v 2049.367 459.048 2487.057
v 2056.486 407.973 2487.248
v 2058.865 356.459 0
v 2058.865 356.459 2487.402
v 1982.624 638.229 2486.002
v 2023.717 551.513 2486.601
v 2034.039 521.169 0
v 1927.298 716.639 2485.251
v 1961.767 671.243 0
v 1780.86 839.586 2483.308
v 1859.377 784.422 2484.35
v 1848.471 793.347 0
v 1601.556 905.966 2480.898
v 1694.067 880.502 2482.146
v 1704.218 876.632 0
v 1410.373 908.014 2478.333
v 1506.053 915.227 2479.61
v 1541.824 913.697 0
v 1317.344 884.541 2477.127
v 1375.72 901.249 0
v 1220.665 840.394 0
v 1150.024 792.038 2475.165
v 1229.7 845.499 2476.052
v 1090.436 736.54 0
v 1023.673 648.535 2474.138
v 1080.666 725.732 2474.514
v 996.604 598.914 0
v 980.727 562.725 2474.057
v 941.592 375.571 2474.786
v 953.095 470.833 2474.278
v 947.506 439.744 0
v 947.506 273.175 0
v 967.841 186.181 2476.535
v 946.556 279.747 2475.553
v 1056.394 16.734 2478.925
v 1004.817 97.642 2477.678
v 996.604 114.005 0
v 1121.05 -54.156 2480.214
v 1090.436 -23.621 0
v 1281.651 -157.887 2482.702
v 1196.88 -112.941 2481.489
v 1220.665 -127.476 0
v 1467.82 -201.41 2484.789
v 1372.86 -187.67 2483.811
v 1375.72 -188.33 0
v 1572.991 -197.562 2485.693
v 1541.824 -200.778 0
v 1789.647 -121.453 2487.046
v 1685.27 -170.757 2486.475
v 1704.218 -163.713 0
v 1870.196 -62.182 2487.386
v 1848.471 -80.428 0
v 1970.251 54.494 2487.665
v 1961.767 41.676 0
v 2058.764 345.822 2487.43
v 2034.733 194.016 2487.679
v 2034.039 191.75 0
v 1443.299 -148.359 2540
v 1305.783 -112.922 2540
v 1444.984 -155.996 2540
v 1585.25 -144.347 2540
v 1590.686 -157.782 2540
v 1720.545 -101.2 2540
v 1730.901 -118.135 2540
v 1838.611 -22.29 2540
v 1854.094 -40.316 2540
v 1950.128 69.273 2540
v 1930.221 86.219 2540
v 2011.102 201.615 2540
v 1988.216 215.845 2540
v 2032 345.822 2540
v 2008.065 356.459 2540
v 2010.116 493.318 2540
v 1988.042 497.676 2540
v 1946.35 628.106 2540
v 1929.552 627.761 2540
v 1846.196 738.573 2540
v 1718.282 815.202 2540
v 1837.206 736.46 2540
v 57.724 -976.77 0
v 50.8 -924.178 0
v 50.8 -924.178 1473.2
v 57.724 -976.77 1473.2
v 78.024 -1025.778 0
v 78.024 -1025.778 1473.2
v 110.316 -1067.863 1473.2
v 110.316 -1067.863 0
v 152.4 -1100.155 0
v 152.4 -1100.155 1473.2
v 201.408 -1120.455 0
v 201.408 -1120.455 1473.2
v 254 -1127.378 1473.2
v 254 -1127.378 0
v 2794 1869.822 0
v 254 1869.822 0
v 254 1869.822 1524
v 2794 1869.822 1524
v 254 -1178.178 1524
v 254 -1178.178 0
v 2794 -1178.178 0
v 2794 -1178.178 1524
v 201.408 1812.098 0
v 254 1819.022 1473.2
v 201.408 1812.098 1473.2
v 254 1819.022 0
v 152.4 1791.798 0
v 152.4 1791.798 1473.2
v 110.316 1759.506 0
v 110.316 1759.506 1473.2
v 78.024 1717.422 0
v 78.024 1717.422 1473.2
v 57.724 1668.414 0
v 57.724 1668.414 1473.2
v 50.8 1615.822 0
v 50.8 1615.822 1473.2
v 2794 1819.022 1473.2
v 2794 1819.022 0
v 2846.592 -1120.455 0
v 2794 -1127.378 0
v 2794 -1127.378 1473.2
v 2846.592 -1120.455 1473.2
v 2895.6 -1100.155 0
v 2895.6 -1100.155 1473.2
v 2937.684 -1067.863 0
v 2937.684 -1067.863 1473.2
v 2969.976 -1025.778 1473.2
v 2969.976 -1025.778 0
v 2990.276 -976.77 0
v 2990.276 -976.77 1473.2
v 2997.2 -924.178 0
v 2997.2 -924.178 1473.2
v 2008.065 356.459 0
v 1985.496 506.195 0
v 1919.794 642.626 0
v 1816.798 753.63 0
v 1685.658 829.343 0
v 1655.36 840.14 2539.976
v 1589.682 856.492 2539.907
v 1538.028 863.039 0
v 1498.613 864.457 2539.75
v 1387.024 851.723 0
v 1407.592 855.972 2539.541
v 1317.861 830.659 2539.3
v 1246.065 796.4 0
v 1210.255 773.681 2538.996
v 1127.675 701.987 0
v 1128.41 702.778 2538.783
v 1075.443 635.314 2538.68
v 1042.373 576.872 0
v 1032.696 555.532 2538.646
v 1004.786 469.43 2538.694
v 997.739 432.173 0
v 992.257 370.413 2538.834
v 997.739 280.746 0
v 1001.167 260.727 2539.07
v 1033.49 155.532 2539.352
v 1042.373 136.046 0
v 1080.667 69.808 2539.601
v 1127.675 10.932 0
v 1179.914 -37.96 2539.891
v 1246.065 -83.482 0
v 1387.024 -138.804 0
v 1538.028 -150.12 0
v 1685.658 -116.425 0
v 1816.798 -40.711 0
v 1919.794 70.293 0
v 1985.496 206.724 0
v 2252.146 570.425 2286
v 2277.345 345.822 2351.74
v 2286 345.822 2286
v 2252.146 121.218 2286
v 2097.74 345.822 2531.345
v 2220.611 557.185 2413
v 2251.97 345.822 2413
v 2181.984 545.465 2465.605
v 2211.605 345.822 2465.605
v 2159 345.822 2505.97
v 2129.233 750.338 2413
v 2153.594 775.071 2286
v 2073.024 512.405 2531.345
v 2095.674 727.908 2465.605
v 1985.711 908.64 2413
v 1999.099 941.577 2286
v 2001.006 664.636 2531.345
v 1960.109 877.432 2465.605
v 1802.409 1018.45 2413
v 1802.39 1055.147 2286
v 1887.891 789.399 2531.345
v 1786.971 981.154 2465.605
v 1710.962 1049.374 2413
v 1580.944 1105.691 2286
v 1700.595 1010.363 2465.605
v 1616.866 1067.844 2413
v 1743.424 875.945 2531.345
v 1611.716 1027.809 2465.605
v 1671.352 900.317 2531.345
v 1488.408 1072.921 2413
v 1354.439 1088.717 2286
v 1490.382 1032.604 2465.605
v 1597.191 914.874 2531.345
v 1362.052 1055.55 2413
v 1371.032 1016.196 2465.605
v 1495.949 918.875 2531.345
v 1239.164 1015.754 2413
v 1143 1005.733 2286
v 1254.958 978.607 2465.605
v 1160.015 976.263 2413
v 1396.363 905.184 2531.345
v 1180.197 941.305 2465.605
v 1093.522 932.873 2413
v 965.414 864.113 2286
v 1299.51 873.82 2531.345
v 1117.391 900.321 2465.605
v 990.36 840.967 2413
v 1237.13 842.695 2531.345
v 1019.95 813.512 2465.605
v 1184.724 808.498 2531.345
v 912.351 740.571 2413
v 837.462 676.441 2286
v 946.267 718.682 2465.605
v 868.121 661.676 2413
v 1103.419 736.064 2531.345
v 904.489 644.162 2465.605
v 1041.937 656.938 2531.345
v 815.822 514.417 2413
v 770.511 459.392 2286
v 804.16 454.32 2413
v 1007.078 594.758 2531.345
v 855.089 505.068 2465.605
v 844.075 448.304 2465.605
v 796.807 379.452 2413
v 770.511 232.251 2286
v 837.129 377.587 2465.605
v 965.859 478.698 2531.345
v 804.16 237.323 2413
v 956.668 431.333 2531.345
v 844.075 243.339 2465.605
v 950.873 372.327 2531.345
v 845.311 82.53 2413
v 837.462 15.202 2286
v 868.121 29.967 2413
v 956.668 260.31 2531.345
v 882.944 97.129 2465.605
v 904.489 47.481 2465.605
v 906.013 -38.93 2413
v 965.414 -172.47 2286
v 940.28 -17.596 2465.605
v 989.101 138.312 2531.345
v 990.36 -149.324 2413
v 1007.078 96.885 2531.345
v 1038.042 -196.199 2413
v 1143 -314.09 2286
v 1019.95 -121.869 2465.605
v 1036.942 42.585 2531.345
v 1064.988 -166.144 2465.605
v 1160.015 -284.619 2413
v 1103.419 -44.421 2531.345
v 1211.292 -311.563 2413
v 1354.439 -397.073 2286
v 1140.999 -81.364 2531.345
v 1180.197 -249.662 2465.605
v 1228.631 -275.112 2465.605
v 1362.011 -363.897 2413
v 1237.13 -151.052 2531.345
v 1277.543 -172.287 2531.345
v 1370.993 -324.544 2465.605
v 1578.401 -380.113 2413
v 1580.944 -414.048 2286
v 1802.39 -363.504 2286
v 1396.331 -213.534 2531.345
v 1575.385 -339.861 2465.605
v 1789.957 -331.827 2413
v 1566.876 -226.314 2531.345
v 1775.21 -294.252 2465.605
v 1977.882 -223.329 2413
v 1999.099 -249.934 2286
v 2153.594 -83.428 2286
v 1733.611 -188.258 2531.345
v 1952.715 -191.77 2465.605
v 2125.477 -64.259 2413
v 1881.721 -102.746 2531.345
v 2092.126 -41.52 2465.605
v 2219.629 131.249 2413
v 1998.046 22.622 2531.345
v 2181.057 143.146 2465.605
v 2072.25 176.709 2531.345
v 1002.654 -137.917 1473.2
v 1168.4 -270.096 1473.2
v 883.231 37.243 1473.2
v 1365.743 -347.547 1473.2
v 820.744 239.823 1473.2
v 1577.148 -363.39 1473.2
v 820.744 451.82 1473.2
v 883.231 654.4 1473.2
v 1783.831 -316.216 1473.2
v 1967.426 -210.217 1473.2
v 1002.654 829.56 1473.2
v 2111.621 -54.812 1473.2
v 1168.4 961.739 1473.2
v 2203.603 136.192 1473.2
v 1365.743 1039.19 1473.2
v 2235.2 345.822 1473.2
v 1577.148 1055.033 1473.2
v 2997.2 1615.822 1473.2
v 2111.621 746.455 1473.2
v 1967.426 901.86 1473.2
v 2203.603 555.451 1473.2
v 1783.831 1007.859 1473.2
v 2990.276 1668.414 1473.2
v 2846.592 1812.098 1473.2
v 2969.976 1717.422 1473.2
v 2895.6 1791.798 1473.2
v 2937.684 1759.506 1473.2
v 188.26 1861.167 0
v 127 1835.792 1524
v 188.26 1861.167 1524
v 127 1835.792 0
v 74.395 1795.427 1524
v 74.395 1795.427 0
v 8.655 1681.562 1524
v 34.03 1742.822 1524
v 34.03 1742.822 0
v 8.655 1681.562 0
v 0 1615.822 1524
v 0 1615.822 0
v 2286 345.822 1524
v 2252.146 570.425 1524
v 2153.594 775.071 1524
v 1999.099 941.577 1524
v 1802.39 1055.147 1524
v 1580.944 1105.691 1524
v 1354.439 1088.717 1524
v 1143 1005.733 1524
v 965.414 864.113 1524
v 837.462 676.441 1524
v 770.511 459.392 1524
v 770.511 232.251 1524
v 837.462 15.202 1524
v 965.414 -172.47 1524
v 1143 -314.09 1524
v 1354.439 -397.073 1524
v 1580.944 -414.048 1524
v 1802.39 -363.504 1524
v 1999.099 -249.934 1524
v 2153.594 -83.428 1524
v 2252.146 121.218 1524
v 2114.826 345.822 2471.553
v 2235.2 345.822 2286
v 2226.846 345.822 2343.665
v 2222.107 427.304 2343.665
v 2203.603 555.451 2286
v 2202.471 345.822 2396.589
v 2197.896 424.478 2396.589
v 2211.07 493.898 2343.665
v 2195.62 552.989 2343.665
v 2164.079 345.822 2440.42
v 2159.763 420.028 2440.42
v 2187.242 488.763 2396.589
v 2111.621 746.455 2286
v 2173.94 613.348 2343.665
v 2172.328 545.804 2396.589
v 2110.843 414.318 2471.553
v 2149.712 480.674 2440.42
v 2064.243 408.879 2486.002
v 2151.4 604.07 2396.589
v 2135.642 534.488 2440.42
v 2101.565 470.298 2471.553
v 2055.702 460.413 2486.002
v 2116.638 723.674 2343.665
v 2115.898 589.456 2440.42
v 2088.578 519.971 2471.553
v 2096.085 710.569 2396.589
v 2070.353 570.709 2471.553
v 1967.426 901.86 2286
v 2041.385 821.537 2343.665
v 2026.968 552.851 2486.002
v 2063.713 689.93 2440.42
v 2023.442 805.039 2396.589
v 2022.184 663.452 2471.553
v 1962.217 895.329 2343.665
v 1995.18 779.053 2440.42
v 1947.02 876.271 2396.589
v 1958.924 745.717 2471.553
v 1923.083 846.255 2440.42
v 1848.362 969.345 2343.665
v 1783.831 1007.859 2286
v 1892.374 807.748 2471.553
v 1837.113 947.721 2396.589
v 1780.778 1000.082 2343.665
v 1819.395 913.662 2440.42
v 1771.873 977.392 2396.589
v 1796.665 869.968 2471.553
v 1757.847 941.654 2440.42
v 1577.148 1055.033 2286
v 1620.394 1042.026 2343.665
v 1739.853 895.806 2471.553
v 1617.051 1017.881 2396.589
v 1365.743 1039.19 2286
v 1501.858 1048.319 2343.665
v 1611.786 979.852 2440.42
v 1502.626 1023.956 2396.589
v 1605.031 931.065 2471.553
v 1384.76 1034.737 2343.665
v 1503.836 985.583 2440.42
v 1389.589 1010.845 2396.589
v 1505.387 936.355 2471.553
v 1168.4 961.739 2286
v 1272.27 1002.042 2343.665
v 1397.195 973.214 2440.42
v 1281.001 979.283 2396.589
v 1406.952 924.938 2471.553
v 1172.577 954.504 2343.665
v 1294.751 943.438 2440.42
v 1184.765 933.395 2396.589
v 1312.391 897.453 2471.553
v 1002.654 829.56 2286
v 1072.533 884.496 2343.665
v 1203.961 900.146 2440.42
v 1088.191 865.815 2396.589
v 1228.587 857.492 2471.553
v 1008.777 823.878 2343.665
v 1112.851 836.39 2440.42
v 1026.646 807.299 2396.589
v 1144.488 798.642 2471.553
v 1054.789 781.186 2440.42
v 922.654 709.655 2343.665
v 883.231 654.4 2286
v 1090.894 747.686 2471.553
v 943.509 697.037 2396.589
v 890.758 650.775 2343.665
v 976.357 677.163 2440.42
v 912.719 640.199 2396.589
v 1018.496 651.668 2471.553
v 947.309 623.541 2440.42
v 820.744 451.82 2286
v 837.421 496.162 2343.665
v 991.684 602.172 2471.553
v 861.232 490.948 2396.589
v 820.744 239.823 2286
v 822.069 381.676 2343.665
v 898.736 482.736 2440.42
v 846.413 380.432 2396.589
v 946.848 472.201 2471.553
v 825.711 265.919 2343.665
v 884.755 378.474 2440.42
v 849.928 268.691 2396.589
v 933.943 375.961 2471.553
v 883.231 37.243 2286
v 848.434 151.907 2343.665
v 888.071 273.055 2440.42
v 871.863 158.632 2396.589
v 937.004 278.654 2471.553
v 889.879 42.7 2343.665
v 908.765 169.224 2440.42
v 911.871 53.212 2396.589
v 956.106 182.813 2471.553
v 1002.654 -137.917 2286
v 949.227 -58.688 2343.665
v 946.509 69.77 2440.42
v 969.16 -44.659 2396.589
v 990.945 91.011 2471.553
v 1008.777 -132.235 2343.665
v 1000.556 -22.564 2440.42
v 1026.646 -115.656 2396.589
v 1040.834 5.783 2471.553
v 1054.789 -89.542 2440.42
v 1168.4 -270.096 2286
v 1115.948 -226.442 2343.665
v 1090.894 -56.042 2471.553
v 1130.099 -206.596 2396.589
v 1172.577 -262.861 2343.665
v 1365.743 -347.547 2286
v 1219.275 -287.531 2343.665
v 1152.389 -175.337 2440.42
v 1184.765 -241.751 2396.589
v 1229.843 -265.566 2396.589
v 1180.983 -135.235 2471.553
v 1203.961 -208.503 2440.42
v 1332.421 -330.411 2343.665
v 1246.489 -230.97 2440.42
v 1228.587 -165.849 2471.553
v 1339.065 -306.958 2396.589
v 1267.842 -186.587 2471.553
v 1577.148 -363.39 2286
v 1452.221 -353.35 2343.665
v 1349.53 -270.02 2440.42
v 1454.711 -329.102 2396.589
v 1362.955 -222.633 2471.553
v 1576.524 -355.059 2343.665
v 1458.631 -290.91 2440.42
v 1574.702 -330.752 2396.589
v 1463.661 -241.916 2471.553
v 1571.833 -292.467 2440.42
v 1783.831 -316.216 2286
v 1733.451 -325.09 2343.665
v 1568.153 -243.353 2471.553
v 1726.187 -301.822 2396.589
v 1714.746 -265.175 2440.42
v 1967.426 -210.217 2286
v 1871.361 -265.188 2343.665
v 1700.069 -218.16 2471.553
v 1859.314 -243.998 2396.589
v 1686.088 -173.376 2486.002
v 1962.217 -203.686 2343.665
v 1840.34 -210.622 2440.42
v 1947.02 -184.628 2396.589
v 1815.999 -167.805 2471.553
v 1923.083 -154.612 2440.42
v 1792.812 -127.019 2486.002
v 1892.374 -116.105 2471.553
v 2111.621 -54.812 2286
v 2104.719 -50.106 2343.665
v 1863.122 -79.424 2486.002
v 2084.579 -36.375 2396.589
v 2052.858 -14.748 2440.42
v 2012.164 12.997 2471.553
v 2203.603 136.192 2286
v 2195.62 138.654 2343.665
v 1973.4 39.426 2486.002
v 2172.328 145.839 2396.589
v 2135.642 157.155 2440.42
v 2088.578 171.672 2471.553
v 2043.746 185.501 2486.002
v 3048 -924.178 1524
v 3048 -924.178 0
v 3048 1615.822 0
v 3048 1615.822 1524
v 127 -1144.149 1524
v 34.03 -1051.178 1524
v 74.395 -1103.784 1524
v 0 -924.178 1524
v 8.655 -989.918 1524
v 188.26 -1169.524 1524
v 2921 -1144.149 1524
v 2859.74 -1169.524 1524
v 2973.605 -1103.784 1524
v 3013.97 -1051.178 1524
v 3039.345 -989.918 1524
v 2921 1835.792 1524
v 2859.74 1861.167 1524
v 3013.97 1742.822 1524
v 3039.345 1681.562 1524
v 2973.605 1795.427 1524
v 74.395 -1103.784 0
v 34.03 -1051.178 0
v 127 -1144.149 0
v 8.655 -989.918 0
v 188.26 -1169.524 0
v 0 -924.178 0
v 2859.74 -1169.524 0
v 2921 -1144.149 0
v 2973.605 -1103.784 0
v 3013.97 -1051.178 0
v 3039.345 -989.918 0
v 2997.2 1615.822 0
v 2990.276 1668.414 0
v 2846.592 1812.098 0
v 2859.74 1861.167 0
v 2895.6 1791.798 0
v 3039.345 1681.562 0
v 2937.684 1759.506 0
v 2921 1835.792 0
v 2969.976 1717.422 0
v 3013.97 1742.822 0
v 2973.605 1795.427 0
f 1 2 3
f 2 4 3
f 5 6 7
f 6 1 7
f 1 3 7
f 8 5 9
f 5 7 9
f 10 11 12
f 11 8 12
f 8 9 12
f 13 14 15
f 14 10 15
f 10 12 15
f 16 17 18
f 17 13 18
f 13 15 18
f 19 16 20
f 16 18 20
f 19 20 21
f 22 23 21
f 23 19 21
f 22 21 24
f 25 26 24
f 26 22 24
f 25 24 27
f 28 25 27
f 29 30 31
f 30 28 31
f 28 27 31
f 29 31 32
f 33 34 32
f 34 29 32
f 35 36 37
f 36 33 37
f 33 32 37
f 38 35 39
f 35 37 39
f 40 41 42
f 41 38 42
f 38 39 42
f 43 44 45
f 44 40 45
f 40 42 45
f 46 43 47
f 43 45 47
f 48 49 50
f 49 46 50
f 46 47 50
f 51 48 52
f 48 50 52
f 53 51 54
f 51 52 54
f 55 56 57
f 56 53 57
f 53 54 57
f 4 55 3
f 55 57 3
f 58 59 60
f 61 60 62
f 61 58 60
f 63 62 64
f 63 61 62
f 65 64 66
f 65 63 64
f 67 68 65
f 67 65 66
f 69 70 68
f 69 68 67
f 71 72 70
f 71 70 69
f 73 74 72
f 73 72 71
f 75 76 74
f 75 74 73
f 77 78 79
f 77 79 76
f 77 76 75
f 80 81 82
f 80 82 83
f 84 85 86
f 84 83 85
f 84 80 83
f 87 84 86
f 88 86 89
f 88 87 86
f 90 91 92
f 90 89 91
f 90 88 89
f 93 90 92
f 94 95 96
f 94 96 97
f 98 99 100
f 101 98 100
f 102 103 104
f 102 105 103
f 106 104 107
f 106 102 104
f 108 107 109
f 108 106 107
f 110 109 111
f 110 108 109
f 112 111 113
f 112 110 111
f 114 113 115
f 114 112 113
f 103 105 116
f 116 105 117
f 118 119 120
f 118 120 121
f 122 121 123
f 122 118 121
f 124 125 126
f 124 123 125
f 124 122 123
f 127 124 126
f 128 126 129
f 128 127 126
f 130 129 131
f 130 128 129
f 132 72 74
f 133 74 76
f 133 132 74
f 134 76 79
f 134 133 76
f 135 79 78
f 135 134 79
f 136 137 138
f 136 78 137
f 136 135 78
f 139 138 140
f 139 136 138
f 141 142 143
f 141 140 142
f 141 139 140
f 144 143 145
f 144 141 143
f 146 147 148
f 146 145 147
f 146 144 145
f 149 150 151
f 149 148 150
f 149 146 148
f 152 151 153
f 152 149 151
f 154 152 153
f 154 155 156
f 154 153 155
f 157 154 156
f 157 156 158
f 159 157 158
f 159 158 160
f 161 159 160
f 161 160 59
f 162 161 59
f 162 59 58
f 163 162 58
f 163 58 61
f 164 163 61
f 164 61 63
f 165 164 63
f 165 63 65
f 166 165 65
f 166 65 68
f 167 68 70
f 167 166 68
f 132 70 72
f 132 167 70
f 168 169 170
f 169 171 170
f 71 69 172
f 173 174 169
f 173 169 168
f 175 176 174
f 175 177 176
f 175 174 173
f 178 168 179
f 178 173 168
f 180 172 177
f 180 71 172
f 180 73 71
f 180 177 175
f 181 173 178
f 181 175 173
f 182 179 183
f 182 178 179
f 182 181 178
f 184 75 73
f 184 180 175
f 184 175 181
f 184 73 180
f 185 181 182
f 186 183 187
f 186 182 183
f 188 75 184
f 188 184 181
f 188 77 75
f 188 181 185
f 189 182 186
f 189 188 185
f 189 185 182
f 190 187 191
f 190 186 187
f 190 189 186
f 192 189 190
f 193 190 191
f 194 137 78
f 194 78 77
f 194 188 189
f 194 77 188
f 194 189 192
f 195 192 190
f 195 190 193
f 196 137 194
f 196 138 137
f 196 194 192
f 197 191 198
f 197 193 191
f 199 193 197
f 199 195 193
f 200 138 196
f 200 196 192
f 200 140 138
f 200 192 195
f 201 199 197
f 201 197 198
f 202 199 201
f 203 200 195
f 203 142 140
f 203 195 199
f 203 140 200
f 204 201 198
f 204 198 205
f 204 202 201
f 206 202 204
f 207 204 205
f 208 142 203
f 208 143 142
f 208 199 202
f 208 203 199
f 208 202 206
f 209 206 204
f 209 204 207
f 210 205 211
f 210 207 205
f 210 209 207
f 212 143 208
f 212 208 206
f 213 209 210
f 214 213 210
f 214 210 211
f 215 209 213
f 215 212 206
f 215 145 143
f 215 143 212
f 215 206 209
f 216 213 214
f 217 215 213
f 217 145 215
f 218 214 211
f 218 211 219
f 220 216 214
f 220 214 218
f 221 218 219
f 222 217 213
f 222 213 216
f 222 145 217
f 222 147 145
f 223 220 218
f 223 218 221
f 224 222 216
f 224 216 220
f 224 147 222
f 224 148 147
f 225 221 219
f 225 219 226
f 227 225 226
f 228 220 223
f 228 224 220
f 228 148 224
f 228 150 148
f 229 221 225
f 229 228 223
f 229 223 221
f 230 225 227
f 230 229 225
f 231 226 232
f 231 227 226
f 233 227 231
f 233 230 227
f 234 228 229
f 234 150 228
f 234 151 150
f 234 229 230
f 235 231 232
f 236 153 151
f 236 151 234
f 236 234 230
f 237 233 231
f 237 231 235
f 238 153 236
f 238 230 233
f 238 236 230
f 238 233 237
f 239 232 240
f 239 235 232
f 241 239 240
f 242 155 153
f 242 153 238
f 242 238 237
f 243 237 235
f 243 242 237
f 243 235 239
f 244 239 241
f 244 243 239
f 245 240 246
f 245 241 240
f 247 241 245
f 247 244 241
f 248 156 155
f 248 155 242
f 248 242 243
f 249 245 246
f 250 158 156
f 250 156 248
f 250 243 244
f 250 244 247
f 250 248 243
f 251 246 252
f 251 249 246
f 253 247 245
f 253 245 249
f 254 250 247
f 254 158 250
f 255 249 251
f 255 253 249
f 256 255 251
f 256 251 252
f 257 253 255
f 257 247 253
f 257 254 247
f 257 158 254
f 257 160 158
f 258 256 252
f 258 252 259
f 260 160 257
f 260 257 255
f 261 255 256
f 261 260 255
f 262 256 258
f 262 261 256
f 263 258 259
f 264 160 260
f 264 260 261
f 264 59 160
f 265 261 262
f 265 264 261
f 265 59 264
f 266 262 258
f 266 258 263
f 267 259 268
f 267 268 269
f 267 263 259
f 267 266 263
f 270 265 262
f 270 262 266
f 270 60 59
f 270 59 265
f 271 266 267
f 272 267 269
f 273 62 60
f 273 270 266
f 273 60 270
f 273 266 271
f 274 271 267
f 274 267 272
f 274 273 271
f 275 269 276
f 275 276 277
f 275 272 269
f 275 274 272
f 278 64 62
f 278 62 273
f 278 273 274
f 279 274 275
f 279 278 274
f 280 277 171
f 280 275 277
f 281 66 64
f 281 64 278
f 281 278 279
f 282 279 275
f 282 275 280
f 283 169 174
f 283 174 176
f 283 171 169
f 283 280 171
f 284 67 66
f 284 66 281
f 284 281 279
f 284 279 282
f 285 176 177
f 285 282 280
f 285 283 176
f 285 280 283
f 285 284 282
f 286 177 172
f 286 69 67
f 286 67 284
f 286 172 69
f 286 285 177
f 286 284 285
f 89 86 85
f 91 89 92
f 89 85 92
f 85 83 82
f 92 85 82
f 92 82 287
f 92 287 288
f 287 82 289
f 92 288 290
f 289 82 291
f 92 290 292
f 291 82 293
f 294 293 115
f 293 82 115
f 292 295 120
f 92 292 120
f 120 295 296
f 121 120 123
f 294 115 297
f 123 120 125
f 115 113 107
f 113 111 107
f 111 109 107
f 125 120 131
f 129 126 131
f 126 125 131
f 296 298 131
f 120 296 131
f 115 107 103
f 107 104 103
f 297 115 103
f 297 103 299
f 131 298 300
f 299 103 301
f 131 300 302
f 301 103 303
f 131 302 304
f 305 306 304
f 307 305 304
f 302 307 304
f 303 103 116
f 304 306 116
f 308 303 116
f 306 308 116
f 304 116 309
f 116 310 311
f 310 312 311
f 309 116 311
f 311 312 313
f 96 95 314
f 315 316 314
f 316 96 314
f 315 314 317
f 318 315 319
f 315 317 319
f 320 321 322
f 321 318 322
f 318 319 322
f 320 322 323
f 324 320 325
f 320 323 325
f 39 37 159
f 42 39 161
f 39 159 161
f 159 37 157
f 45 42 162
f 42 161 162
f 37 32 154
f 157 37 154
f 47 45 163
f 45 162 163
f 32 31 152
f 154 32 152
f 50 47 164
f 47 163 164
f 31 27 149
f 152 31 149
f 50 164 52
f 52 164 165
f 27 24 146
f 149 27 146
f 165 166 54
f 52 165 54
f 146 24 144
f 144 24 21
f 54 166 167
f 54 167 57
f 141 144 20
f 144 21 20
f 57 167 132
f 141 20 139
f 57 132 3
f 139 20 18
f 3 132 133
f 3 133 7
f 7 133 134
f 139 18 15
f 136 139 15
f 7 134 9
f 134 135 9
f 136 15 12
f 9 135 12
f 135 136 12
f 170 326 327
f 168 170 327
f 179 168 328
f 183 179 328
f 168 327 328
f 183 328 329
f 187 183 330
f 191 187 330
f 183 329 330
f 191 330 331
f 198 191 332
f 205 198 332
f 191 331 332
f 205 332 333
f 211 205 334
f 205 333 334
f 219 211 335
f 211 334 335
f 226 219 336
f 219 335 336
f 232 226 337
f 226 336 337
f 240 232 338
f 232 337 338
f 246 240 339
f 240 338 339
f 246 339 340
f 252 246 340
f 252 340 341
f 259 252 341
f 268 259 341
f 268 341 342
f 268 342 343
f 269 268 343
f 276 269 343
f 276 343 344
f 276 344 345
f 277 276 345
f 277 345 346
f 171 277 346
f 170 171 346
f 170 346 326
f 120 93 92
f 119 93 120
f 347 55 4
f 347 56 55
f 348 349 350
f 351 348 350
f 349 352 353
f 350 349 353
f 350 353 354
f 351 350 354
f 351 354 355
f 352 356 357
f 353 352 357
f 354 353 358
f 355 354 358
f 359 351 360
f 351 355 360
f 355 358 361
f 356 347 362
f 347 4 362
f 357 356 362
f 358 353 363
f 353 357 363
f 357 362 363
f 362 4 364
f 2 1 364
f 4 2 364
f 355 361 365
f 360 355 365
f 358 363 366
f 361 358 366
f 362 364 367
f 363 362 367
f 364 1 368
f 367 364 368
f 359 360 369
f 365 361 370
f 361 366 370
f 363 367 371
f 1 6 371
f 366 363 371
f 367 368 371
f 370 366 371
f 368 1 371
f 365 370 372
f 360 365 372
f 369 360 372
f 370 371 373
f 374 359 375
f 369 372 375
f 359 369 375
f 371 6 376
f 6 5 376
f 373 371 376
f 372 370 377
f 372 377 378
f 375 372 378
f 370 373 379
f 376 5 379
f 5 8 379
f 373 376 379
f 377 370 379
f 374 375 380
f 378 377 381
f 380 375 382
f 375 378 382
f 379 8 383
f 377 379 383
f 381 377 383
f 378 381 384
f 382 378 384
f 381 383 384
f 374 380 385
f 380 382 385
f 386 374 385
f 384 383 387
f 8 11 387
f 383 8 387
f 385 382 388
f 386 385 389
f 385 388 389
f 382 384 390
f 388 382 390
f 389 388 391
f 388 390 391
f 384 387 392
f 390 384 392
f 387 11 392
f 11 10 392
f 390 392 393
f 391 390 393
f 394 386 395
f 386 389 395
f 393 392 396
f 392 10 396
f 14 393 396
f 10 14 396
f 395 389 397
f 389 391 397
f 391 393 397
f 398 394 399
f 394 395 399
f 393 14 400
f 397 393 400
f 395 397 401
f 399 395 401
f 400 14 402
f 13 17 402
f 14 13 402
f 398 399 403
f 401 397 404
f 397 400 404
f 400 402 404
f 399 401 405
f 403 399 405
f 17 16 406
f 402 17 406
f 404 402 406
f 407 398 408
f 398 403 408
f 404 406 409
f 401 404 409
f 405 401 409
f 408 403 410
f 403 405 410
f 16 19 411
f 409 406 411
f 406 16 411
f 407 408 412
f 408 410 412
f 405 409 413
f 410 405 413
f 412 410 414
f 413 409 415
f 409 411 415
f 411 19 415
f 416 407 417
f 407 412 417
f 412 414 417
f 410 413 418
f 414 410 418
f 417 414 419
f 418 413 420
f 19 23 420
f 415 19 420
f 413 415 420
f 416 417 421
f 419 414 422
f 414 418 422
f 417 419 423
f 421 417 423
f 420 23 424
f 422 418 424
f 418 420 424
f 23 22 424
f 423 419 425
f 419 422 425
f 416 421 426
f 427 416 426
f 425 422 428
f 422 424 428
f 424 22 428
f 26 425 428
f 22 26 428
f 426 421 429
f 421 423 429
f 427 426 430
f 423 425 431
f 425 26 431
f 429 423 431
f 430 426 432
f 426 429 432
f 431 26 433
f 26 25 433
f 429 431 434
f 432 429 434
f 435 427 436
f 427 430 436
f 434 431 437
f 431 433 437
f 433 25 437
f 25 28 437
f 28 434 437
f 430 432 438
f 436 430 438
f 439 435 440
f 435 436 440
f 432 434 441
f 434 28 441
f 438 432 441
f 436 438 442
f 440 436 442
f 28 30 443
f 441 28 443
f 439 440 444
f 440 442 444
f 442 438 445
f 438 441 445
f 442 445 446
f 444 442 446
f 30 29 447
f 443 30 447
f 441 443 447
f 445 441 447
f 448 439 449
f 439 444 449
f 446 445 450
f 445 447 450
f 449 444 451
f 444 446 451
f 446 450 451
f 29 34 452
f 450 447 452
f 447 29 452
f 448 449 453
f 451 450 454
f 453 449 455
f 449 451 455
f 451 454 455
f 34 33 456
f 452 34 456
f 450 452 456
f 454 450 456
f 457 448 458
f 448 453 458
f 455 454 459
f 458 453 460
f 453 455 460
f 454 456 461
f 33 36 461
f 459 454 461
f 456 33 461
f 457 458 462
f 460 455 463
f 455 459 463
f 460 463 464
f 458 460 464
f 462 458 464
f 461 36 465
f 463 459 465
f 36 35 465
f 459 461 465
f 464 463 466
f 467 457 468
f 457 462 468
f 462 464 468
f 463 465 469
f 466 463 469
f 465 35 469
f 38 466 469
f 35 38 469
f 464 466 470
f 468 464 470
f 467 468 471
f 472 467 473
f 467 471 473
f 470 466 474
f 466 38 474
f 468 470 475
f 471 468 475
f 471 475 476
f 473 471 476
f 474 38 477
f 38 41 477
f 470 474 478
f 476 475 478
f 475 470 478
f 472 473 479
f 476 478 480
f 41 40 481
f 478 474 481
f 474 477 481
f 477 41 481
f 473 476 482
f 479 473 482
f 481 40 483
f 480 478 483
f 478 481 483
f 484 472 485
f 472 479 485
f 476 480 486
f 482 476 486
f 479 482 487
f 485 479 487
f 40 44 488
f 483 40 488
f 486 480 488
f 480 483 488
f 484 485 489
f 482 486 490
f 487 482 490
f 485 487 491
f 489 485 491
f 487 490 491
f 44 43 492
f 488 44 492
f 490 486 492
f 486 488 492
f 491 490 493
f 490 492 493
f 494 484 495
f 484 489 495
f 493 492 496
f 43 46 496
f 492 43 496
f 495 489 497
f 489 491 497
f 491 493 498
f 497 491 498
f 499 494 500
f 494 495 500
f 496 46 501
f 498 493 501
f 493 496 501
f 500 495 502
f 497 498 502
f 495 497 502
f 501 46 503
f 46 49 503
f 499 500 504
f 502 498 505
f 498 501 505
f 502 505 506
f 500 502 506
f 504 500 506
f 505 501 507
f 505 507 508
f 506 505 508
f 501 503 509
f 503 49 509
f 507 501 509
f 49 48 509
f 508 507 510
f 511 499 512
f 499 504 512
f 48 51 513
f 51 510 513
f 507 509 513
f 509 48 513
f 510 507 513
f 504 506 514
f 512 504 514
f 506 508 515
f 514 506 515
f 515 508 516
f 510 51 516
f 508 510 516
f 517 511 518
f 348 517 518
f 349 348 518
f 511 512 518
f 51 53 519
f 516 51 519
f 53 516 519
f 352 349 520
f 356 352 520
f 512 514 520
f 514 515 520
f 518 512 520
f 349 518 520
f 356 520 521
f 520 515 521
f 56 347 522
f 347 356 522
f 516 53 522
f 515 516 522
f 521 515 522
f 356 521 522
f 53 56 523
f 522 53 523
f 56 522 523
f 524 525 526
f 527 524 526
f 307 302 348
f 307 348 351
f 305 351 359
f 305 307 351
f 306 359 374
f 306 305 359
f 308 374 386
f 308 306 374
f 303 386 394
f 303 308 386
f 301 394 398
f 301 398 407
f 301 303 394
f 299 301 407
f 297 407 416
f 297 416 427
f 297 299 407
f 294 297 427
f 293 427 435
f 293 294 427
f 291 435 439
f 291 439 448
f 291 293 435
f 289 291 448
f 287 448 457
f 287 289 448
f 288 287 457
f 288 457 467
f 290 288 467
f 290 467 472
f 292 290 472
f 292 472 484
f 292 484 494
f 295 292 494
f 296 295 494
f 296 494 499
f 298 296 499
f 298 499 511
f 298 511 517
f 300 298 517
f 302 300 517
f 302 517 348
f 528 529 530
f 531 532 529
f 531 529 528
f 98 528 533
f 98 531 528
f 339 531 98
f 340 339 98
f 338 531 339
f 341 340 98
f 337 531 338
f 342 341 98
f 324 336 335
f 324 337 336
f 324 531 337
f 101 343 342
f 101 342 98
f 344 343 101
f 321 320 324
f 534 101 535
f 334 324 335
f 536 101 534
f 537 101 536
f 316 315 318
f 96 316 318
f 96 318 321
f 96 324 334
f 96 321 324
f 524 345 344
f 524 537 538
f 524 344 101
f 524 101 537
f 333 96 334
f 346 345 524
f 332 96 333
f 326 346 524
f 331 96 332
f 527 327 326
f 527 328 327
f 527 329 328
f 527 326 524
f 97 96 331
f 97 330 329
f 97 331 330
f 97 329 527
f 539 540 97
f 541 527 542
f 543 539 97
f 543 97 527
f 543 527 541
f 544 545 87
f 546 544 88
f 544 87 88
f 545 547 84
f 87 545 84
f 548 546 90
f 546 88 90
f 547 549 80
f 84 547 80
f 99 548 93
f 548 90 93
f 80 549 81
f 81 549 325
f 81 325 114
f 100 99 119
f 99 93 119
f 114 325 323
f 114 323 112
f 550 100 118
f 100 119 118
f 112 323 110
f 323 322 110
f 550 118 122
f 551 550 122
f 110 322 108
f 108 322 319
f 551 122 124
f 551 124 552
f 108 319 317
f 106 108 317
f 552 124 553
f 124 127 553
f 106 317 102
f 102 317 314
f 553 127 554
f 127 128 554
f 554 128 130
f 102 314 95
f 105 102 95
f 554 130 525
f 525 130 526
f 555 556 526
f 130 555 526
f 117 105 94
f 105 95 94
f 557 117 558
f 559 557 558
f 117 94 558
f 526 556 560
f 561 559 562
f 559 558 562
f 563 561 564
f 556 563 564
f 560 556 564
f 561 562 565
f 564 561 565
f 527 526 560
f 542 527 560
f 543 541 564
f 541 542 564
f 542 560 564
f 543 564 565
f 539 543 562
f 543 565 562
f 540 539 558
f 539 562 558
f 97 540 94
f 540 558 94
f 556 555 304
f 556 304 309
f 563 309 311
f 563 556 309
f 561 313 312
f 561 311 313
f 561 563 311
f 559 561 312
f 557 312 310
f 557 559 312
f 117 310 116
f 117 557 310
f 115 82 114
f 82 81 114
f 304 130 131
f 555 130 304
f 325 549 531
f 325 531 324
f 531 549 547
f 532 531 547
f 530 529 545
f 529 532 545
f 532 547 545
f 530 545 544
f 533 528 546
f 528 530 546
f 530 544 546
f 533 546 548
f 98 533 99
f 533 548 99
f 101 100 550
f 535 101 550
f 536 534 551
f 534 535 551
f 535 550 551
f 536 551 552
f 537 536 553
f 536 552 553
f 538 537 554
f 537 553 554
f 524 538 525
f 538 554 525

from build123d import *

# Parameters (mm, degrees)
SKETCH2_W               = 3048
SKETCH2_H               = 3048
BOSS_EXTRUDE1_DEPTH     = 1524
SKETCH3_R               = 762
BOSS_EXTRUDE2_DEPTH     = 1016
CUT_EXTRUDE1_DEPTH      = 4387.130048435
CUT_EXTRUDE1_DEPTH_BACK = 4387.130048435
SKETCH8_R               = 508
FILLET1_R               = 254
SHELL1_T                = -50.8


with BuildPart() as part:
    # Sketch2 → Boss-Extrude1 (new body)
    with BuildSketch(Plane.XY):
        with Locations((1524, 345.821596244)):
            Rectangle(SKETCH2_W, SKETCH2_H)
    extrude(amount=BOSS_EXTRUDE1_DEPTH)

    # Sketch3 → Boss-Extrude2 (add)
    with BuildSketch(Plane.XY.offset(1524)):
        with Locations((1524, 345.821596244)):
            Circle(SKETCH3_R)
    extrude(amount=BOSS_EXTRUDE2_DEPTH)

    # Sketch8 → Cut-Extrude1 (cut, two sides: drawn at the far end of the back side and taken through both)
    with BuildSketch(Plane.XY.offset(2540).offset(-CUT_EXTRUDE1_DEPTH_BACK)):
        with Locations((1500.065105654, 356.459327065)):
            Circle(SKETCH8_R)
    extrude(amount=CUT_EXTRUDE1_DEPTH + CUT_EXTRUDE1_DEPTH_BACK, mode=Mode.SUBTRACT)

    # Fillet1
    # the kernel refuses this fillet: 254 mm, written as the material it takes off along each edge
    with BuildSketch(Plane(origin=(1524, 345.821596244, 2540), x_dir=(1, 0, 0), z_dir=(0, -1, 0))) as fillet1_piece_1:
        with BuildLine():
            CenterArc((762 - FILLET1_R, -FILLET1_R), FILLET1_R, 0, 90)
            Line((762 - FILLET1_R, 0), (762, 0))
            Line((762, 0), (762, -FILLET1_R))
        make_face()
    revolve(axis=Axis((1524, 345.821596244, 2540), (0, 0, 1)), mode=Mode.SUBTRACT)
    with BuildSketch(Plane(origin=(0, 1869.821596244, -635), x_dir=(0, -1, 0), z_dir=(0, 0, 1)), Plane(origin=(0, -1178.178403756, -635), x_dir=(1, 0, 0), z_dir=(0, 0, 1))) as fillet1_piece_2:
        with BuildLine():
            CenterArc((FILLET1_R, FILLET1_R), FILLET1_R, 180, 90)
            Line((0, FILLET1_R), (0, 0))
            Line((0, 0), (FILLET1_R, 0))
        make_face()
    extrude(amount=2794, mode=Mode.SUBTRACT)
    with BuildSketch(Plane(origin=(3048, 1869.821596244, -635), x_dir=(0, -1, 0), z_dir=(0, 0, 1)), Plane(origin=(3048, -1178.178403756, -635), x_dir=(-1, 0, 0), z_dir=(0, 0, 1))) as fillet1_piece_3:
        with BuildLine():
            CenterArc((FILLET1_R, -FILLET1_R), FILLET1_R, 90, 90)
            Line((0, -FILLET1_R), (0, 0))
            Line((0, 0), (FILLET1_R, 0))
        make_face()
    extrude(amount=2794, mode=Mode.SUBTRACT)

    # Shell1
    shell1_openings = [part.faces().sort_by_distance(p)[0] for p in [
        (104.874877579, -1073.303526177, 0),
    ]]
    offset(amount=SHELL1_T, openings=shell1_openings, kind=Kind.INTERSECTION)


solid = part.part
